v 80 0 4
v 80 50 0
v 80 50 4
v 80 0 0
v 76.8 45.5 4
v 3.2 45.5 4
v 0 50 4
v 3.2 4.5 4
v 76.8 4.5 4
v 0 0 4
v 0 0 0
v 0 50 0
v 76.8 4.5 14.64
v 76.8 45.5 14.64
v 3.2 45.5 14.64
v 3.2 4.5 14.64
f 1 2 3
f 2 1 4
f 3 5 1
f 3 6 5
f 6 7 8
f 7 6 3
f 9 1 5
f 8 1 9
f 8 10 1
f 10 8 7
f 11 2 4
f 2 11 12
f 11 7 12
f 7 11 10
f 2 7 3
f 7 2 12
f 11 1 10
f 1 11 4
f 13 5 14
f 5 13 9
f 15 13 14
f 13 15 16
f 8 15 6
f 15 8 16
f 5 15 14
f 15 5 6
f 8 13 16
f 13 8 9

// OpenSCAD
union() {
	translate(v = [40.0, 25.0, 2.0]) {
		cube(center = true, size = [80.0, 50.0, 4.0]);
	}
	translate(v = [40.0, 25.0, 9.32]) {
		cube(center = true, size = [73.6, 41.0, 10.64]);
	}
}
